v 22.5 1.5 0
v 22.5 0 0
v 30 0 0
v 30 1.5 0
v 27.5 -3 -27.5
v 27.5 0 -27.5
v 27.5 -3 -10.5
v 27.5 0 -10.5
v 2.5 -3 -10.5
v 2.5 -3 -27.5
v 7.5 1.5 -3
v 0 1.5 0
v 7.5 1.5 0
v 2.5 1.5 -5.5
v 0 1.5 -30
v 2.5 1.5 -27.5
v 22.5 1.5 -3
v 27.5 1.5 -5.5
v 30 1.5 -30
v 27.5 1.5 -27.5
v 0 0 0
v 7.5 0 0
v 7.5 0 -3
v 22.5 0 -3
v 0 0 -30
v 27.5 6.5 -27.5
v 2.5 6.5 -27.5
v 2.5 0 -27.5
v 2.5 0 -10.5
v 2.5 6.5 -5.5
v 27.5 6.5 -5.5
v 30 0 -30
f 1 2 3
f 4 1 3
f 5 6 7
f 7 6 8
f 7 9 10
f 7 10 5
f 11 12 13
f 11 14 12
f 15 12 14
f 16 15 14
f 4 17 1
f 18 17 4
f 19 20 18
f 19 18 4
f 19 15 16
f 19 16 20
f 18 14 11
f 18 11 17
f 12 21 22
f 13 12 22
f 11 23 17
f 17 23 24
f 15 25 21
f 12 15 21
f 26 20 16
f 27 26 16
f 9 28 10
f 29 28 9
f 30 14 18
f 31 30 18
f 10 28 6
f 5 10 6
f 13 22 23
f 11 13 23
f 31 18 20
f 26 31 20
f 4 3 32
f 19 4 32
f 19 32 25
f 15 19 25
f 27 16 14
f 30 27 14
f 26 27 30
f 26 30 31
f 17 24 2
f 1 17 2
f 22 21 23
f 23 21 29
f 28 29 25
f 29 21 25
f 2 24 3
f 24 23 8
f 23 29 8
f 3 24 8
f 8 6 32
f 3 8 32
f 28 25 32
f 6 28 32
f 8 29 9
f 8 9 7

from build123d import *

# Parameters (mm, degrees)
BOSS_EXTRUDE1_DEPTH = 1.5
BOSS_EXTRUDE2_DEPTH = 5
SKETCH3_W           = 25
SKETCH3_H           = 17
BOSS_EXTRUDE3_DEPTH = 3


with BuildPart() as part:
    # Sketch1 → Boss-Extrude1 (new body)
    with BuildSketch(Plane(origin=(0, 0, 0), x_dir=(1, 0, 0), z_dir=(0, 1, 0))):
        Polygon((0, 30), (0, 0), (7.5, 0), (7.5, 3), (22.5, 3), (22.5, 0), (30, 0), (30, 30), align=None)
    extrude(amount=BOSS_EXTRUDE1_DEPTH)

    # Sketch2 → Boss-Extrude2 (add)
    with BuildSketch(Plane(origin=(0, 1.5, 0), x_dir=(1, 0, 0), z_dir=(0, 1, 0))):
        Polygon((25, 5.5), (27.5, 5.5), (27.5, 27.5), (2.5, 27.5), (2.5, 5.5), (5, 5.5), align=None)
    extrude(amount=BOSS_EXTRUDE2_DEPTH)

    # Sketch3 → Boss-Extrude3 (add)
    with BuildSketch(Plane.XZ):
        with Locations((15, -19)):
            Rectangle(SKETCH3_W, SKETCH3_H)
    extrude(amount=BOSS_EXTRUDE3_DEPTH)


solid = part.part
